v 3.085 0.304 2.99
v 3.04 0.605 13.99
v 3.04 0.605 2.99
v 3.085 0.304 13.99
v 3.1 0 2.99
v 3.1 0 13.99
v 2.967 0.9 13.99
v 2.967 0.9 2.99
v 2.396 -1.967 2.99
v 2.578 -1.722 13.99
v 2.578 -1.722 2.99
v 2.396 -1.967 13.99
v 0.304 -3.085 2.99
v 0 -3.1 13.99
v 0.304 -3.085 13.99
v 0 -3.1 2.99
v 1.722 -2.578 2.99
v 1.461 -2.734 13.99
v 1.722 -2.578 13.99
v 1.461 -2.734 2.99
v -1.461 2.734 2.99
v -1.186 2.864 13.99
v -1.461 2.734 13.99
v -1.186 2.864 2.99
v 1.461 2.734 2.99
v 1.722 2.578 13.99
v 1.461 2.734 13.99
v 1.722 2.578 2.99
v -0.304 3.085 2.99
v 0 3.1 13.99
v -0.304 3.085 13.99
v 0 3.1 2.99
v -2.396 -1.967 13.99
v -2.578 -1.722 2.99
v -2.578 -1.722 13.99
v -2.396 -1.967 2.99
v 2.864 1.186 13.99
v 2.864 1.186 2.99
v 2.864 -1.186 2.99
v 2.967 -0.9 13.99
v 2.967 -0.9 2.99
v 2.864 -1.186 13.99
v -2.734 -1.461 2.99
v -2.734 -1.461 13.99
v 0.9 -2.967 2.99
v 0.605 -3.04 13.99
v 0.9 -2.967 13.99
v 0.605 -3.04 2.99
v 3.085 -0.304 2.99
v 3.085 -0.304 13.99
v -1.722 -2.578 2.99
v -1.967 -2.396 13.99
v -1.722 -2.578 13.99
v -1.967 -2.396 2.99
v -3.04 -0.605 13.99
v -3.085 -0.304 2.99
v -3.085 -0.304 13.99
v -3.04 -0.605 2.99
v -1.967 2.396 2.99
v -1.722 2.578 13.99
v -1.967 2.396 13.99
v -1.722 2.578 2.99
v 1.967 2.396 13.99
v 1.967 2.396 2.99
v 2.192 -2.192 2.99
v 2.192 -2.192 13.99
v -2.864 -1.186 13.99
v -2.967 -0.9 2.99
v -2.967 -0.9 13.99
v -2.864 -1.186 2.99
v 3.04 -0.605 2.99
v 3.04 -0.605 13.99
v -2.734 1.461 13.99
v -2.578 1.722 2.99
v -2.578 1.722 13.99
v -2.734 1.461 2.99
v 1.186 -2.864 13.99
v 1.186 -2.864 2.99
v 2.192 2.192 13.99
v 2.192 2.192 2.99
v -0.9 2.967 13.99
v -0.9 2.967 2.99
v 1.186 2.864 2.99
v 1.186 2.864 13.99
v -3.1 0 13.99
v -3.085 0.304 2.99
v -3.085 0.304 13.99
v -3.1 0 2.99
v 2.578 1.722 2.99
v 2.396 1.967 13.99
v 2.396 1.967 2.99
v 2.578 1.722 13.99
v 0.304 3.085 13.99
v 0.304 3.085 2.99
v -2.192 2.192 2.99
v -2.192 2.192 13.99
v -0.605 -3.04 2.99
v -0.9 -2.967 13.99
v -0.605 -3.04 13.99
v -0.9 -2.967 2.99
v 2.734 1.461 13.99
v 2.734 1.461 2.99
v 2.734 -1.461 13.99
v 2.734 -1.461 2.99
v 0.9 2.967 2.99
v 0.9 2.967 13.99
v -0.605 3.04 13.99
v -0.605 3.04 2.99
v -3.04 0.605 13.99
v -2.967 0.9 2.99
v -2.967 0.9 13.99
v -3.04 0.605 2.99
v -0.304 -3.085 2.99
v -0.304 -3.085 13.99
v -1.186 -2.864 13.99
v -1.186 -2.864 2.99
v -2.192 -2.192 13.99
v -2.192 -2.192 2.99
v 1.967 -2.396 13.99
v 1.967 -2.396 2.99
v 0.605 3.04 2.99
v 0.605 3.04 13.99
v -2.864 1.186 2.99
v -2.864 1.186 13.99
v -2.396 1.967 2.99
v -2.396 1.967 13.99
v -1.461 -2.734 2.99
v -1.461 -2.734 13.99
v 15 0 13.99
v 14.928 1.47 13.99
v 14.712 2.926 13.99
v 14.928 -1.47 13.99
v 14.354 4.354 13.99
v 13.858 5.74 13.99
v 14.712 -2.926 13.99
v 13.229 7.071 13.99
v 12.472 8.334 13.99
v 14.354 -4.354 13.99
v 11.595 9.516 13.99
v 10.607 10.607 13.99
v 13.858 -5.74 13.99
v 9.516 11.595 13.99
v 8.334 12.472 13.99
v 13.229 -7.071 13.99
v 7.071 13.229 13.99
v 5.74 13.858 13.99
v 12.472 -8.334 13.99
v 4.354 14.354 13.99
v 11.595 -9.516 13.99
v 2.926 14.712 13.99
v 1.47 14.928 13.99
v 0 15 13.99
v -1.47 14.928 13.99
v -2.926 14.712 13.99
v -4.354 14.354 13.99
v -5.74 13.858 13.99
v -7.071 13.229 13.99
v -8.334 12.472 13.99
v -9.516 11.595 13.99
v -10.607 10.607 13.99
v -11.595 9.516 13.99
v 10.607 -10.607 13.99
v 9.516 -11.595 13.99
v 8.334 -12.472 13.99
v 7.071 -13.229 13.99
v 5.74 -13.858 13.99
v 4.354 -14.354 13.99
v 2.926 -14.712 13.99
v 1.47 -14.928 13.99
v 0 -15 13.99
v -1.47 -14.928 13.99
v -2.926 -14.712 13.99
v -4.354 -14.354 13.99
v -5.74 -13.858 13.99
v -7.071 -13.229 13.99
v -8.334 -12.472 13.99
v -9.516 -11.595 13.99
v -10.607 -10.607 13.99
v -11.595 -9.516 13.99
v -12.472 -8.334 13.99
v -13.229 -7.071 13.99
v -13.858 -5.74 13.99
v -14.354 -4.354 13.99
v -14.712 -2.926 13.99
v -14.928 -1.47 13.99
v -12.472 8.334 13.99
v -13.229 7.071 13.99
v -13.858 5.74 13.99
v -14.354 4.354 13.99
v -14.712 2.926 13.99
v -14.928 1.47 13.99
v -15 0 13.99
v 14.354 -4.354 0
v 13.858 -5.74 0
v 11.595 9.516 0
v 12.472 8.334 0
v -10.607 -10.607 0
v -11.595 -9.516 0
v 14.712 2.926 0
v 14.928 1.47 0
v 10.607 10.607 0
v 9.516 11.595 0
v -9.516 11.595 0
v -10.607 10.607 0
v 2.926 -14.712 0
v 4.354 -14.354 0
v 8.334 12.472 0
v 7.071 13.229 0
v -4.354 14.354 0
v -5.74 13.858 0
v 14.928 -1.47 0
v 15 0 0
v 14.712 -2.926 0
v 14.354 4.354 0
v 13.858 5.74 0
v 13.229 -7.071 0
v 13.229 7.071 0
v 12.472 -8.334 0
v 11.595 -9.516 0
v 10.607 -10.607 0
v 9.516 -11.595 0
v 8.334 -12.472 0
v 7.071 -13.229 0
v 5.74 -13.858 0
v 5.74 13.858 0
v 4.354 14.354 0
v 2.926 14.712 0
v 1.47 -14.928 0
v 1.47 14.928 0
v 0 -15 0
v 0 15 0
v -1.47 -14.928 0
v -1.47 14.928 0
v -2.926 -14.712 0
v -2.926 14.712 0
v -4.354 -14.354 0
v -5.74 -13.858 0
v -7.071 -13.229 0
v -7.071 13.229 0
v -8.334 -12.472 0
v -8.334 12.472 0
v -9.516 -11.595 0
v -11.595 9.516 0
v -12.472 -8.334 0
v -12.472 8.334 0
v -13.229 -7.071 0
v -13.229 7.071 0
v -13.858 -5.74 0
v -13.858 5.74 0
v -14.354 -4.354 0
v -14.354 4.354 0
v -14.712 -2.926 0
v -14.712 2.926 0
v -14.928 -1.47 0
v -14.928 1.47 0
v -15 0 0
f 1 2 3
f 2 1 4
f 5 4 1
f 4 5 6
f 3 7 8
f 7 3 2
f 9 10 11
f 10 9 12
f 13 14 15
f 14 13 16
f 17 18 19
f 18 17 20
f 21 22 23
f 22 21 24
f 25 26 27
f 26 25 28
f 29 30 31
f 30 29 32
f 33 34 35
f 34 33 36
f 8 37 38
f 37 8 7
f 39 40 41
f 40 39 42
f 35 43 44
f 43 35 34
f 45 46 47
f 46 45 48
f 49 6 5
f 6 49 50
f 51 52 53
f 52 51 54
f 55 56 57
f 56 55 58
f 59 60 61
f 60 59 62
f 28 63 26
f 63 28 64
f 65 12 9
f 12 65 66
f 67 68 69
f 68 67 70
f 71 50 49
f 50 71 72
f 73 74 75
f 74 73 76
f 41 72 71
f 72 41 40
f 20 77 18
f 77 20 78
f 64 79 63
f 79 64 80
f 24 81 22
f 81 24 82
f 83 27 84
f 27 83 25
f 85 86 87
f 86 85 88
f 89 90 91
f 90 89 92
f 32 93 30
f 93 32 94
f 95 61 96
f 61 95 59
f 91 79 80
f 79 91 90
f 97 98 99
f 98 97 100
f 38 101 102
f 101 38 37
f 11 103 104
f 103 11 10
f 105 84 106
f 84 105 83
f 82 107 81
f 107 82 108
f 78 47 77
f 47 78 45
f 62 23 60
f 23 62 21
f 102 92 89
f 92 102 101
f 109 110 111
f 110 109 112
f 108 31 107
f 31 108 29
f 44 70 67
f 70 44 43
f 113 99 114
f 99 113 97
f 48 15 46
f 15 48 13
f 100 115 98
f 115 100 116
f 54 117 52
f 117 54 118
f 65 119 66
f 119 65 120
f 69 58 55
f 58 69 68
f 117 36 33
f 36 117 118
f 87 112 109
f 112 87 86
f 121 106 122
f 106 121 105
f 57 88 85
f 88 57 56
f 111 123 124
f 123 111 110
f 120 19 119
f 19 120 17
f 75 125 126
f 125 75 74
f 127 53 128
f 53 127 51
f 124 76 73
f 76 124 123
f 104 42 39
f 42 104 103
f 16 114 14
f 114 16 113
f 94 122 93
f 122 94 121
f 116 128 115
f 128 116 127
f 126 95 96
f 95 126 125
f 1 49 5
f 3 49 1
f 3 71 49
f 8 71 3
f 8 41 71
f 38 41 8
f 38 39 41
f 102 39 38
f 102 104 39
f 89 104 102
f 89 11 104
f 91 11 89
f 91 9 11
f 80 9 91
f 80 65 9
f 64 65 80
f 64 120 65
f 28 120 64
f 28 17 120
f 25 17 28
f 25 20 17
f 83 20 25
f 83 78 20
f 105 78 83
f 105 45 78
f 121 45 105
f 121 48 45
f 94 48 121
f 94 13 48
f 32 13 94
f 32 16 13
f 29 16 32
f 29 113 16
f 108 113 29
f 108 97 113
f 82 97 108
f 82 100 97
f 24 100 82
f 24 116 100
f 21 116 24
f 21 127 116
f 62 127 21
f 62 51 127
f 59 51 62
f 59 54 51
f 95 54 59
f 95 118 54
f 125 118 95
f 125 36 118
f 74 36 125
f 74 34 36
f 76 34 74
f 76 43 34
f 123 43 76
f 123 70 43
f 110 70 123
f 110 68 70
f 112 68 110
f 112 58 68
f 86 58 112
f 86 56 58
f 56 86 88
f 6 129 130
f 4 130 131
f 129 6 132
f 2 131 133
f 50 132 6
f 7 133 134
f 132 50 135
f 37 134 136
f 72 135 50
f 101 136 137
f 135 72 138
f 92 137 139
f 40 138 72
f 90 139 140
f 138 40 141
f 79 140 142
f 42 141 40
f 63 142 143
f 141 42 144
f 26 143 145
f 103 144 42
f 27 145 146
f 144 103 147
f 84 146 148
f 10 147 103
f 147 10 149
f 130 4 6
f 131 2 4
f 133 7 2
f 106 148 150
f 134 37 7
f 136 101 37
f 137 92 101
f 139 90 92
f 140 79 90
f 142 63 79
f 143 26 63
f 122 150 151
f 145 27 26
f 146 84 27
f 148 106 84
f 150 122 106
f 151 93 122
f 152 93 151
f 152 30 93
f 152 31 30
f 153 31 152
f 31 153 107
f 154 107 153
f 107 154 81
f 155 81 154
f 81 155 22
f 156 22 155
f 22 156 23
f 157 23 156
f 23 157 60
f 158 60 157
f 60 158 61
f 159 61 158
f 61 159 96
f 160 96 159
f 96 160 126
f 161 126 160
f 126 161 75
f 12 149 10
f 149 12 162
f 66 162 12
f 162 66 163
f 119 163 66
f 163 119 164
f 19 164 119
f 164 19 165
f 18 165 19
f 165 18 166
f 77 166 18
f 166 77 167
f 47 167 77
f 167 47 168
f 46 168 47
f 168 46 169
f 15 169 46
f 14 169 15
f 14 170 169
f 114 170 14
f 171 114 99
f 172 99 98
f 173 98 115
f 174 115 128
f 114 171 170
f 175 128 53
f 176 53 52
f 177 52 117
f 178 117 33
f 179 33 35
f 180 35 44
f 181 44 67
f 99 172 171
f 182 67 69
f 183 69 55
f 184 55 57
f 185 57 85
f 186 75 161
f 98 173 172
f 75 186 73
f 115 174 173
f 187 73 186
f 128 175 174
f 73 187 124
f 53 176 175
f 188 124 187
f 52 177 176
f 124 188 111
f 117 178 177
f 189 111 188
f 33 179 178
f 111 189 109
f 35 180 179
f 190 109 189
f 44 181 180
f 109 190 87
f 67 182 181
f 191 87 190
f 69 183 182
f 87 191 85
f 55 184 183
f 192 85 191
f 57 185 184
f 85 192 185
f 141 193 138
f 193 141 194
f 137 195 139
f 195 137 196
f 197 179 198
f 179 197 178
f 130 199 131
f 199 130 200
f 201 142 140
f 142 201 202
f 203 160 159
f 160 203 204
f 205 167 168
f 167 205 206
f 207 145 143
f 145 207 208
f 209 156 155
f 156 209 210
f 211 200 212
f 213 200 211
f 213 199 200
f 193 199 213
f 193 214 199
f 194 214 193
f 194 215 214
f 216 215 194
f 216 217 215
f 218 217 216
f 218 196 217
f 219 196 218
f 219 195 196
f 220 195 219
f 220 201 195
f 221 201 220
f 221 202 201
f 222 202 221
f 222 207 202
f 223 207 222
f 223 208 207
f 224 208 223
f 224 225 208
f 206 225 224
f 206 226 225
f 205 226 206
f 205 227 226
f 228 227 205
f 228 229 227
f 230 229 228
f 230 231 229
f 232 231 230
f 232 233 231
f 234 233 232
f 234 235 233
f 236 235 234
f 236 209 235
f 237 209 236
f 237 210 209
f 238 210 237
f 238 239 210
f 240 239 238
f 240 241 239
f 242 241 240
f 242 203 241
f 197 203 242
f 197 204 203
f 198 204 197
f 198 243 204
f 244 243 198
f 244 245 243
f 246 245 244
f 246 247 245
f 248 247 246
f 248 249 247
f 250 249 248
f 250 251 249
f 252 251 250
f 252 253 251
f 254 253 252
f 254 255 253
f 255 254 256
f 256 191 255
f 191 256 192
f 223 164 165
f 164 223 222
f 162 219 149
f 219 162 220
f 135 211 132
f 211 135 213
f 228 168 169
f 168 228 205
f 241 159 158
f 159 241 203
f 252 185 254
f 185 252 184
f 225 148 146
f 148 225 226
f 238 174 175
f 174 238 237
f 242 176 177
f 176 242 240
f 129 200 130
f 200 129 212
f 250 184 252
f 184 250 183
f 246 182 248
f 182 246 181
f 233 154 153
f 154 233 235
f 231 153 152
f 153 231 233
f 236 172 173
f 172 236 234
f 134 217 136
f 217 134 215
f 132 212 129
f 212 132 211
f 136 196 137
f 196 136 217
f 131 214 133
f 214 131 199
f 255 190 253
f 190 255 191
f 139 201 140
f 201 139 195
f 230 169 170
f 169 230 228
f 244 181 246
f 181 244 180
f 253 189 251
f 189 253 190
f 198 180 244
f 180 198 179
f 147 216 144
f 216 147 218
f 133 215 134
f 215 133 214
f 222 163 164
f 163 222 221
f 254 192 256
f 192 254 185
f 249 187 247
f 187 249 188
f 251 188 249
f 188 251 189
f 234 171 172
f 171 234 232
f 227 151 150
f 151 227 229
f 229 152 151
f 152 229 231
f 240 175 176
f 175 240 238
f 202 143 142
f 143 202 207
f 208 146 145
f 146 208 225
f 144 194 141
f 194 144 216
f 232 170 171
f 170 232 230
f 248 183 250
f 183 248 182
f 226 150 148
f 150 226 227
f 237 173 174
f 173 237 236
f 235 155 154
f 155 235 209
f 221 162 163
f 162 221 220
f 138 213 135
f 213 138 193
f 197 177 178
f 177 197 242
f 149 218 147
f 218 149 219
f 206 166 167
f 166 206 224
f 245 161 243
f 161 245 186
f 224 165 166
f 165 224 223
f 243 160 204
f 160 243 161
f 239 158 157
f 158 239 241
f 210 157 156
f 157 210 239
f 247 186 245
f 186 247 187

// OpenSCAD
// Built by bench/smallmodels/features/compiler.py from a list of features.
$fn = 64;
difference() {
  union() {
    translate([0, 0, 0]) cylinder(d = 30, h = 15);
  }
  union() {
    translate([0, 0, 2.99]) rotate([0, 0, 0]) cylinder(d = 6.2, h = 12.02);
    translate([15, 0, 13.99]) rotate([0, 0, 0]) translate([-15, -7.5, 0]) cube([30, 15, 1.02]);
    translate([14.0954, 5.1303, 13.99]) rotate([0, 0, 20]) translate([-15, -7.5, 0]) cube([30, 15, 1.02]);
    translate([11.4907, 9.6418, 13.99]) rotate([0, 0, 40]) translate([-15, -7.5, 0]) cube([30, 15, 1.02]);
    translate([7.5, 12.9904, 13.99]) rotate([0, 0, 60]) translate([-15, -7.5, 0]) cube([30, 15, 1.02]);
    translate([2.6047, 14.7721, 13.99]) rotate([0, 0, 80]) translate([-15, -7.5, 0]) cube([30, 15, 1.02]);
    translate([-2.6047, 14.7721, 13.99]) rotate([0, 0, 100]) translate([-15, -7.5, 0]) cube([30, 15, 1.02]);
    translate([-7.5, 12.9904, 13.99]) rotate([0, 0, 120]) translate([-15, -7.5, 0]) cube([30, 15, 1.02]);
    translate([-11.4907, 9.6418, 13.99]) rotate([0, 0, 140]) translate([-15, -7.5, 0]) cube([30, 15, 1.02]);
    translate([-14.0954, 5.1303, 13.99]) rotate([0, 0, 160]) translate([-15, -7.5, 0]) cube([30, 15, 1.02]);
    translate([-15, 0, 13.99]) rotate([0, 0, 180]) translate([-15, -7.5, 0]) cube([30, 15, 1.02]);
    translate([-14.0954, -5.1303, 13.99]) rotate([0, 0, 200]) translate([-15, -7.5, 0]) cube([30, 15, 1.02]);
    translate([-11.4907, -9.6418, 13.99]) rotate([0, 0, 220]) translate([-15, -7.5, 0]) cube([30, 15, 1.02]);
    translate([-7.5, -12.9904, 13.99]) rotate([0, 0, 240]) translate([-15, -7.5, 0]) cube([30, 15, 1.02]);
    translate([-2.6047, -14.7721, 13.99]) rotate([0, 0, 260]) translate([-15, -7.5, 0]) cube([30, 15, 1.02]);
    translate([2.6047, -14.7721, 13.99]) rotate([0, 0, 280]) translate([-15, -7.5, 0]) cube([30, 15, 1.02]);
    translate([7.5, -12.9904, 13.99]) rotate([0, 0, 300]) translate([-15, -7.5, 0]) cube([30, 15, 1.02]);
    translate([11.4907, -9.6418, 13.99]) rotate([0, 0, 320]) translate([-15, -7.5, 0]) cube([30, 15, 1.02]);
    translate([14.0954, -5.1303, 13.99]) rotate([0, 0, 340]) translate([-15, -7.5, 0]) cube([30, 15, 1.02]);
  }
}
